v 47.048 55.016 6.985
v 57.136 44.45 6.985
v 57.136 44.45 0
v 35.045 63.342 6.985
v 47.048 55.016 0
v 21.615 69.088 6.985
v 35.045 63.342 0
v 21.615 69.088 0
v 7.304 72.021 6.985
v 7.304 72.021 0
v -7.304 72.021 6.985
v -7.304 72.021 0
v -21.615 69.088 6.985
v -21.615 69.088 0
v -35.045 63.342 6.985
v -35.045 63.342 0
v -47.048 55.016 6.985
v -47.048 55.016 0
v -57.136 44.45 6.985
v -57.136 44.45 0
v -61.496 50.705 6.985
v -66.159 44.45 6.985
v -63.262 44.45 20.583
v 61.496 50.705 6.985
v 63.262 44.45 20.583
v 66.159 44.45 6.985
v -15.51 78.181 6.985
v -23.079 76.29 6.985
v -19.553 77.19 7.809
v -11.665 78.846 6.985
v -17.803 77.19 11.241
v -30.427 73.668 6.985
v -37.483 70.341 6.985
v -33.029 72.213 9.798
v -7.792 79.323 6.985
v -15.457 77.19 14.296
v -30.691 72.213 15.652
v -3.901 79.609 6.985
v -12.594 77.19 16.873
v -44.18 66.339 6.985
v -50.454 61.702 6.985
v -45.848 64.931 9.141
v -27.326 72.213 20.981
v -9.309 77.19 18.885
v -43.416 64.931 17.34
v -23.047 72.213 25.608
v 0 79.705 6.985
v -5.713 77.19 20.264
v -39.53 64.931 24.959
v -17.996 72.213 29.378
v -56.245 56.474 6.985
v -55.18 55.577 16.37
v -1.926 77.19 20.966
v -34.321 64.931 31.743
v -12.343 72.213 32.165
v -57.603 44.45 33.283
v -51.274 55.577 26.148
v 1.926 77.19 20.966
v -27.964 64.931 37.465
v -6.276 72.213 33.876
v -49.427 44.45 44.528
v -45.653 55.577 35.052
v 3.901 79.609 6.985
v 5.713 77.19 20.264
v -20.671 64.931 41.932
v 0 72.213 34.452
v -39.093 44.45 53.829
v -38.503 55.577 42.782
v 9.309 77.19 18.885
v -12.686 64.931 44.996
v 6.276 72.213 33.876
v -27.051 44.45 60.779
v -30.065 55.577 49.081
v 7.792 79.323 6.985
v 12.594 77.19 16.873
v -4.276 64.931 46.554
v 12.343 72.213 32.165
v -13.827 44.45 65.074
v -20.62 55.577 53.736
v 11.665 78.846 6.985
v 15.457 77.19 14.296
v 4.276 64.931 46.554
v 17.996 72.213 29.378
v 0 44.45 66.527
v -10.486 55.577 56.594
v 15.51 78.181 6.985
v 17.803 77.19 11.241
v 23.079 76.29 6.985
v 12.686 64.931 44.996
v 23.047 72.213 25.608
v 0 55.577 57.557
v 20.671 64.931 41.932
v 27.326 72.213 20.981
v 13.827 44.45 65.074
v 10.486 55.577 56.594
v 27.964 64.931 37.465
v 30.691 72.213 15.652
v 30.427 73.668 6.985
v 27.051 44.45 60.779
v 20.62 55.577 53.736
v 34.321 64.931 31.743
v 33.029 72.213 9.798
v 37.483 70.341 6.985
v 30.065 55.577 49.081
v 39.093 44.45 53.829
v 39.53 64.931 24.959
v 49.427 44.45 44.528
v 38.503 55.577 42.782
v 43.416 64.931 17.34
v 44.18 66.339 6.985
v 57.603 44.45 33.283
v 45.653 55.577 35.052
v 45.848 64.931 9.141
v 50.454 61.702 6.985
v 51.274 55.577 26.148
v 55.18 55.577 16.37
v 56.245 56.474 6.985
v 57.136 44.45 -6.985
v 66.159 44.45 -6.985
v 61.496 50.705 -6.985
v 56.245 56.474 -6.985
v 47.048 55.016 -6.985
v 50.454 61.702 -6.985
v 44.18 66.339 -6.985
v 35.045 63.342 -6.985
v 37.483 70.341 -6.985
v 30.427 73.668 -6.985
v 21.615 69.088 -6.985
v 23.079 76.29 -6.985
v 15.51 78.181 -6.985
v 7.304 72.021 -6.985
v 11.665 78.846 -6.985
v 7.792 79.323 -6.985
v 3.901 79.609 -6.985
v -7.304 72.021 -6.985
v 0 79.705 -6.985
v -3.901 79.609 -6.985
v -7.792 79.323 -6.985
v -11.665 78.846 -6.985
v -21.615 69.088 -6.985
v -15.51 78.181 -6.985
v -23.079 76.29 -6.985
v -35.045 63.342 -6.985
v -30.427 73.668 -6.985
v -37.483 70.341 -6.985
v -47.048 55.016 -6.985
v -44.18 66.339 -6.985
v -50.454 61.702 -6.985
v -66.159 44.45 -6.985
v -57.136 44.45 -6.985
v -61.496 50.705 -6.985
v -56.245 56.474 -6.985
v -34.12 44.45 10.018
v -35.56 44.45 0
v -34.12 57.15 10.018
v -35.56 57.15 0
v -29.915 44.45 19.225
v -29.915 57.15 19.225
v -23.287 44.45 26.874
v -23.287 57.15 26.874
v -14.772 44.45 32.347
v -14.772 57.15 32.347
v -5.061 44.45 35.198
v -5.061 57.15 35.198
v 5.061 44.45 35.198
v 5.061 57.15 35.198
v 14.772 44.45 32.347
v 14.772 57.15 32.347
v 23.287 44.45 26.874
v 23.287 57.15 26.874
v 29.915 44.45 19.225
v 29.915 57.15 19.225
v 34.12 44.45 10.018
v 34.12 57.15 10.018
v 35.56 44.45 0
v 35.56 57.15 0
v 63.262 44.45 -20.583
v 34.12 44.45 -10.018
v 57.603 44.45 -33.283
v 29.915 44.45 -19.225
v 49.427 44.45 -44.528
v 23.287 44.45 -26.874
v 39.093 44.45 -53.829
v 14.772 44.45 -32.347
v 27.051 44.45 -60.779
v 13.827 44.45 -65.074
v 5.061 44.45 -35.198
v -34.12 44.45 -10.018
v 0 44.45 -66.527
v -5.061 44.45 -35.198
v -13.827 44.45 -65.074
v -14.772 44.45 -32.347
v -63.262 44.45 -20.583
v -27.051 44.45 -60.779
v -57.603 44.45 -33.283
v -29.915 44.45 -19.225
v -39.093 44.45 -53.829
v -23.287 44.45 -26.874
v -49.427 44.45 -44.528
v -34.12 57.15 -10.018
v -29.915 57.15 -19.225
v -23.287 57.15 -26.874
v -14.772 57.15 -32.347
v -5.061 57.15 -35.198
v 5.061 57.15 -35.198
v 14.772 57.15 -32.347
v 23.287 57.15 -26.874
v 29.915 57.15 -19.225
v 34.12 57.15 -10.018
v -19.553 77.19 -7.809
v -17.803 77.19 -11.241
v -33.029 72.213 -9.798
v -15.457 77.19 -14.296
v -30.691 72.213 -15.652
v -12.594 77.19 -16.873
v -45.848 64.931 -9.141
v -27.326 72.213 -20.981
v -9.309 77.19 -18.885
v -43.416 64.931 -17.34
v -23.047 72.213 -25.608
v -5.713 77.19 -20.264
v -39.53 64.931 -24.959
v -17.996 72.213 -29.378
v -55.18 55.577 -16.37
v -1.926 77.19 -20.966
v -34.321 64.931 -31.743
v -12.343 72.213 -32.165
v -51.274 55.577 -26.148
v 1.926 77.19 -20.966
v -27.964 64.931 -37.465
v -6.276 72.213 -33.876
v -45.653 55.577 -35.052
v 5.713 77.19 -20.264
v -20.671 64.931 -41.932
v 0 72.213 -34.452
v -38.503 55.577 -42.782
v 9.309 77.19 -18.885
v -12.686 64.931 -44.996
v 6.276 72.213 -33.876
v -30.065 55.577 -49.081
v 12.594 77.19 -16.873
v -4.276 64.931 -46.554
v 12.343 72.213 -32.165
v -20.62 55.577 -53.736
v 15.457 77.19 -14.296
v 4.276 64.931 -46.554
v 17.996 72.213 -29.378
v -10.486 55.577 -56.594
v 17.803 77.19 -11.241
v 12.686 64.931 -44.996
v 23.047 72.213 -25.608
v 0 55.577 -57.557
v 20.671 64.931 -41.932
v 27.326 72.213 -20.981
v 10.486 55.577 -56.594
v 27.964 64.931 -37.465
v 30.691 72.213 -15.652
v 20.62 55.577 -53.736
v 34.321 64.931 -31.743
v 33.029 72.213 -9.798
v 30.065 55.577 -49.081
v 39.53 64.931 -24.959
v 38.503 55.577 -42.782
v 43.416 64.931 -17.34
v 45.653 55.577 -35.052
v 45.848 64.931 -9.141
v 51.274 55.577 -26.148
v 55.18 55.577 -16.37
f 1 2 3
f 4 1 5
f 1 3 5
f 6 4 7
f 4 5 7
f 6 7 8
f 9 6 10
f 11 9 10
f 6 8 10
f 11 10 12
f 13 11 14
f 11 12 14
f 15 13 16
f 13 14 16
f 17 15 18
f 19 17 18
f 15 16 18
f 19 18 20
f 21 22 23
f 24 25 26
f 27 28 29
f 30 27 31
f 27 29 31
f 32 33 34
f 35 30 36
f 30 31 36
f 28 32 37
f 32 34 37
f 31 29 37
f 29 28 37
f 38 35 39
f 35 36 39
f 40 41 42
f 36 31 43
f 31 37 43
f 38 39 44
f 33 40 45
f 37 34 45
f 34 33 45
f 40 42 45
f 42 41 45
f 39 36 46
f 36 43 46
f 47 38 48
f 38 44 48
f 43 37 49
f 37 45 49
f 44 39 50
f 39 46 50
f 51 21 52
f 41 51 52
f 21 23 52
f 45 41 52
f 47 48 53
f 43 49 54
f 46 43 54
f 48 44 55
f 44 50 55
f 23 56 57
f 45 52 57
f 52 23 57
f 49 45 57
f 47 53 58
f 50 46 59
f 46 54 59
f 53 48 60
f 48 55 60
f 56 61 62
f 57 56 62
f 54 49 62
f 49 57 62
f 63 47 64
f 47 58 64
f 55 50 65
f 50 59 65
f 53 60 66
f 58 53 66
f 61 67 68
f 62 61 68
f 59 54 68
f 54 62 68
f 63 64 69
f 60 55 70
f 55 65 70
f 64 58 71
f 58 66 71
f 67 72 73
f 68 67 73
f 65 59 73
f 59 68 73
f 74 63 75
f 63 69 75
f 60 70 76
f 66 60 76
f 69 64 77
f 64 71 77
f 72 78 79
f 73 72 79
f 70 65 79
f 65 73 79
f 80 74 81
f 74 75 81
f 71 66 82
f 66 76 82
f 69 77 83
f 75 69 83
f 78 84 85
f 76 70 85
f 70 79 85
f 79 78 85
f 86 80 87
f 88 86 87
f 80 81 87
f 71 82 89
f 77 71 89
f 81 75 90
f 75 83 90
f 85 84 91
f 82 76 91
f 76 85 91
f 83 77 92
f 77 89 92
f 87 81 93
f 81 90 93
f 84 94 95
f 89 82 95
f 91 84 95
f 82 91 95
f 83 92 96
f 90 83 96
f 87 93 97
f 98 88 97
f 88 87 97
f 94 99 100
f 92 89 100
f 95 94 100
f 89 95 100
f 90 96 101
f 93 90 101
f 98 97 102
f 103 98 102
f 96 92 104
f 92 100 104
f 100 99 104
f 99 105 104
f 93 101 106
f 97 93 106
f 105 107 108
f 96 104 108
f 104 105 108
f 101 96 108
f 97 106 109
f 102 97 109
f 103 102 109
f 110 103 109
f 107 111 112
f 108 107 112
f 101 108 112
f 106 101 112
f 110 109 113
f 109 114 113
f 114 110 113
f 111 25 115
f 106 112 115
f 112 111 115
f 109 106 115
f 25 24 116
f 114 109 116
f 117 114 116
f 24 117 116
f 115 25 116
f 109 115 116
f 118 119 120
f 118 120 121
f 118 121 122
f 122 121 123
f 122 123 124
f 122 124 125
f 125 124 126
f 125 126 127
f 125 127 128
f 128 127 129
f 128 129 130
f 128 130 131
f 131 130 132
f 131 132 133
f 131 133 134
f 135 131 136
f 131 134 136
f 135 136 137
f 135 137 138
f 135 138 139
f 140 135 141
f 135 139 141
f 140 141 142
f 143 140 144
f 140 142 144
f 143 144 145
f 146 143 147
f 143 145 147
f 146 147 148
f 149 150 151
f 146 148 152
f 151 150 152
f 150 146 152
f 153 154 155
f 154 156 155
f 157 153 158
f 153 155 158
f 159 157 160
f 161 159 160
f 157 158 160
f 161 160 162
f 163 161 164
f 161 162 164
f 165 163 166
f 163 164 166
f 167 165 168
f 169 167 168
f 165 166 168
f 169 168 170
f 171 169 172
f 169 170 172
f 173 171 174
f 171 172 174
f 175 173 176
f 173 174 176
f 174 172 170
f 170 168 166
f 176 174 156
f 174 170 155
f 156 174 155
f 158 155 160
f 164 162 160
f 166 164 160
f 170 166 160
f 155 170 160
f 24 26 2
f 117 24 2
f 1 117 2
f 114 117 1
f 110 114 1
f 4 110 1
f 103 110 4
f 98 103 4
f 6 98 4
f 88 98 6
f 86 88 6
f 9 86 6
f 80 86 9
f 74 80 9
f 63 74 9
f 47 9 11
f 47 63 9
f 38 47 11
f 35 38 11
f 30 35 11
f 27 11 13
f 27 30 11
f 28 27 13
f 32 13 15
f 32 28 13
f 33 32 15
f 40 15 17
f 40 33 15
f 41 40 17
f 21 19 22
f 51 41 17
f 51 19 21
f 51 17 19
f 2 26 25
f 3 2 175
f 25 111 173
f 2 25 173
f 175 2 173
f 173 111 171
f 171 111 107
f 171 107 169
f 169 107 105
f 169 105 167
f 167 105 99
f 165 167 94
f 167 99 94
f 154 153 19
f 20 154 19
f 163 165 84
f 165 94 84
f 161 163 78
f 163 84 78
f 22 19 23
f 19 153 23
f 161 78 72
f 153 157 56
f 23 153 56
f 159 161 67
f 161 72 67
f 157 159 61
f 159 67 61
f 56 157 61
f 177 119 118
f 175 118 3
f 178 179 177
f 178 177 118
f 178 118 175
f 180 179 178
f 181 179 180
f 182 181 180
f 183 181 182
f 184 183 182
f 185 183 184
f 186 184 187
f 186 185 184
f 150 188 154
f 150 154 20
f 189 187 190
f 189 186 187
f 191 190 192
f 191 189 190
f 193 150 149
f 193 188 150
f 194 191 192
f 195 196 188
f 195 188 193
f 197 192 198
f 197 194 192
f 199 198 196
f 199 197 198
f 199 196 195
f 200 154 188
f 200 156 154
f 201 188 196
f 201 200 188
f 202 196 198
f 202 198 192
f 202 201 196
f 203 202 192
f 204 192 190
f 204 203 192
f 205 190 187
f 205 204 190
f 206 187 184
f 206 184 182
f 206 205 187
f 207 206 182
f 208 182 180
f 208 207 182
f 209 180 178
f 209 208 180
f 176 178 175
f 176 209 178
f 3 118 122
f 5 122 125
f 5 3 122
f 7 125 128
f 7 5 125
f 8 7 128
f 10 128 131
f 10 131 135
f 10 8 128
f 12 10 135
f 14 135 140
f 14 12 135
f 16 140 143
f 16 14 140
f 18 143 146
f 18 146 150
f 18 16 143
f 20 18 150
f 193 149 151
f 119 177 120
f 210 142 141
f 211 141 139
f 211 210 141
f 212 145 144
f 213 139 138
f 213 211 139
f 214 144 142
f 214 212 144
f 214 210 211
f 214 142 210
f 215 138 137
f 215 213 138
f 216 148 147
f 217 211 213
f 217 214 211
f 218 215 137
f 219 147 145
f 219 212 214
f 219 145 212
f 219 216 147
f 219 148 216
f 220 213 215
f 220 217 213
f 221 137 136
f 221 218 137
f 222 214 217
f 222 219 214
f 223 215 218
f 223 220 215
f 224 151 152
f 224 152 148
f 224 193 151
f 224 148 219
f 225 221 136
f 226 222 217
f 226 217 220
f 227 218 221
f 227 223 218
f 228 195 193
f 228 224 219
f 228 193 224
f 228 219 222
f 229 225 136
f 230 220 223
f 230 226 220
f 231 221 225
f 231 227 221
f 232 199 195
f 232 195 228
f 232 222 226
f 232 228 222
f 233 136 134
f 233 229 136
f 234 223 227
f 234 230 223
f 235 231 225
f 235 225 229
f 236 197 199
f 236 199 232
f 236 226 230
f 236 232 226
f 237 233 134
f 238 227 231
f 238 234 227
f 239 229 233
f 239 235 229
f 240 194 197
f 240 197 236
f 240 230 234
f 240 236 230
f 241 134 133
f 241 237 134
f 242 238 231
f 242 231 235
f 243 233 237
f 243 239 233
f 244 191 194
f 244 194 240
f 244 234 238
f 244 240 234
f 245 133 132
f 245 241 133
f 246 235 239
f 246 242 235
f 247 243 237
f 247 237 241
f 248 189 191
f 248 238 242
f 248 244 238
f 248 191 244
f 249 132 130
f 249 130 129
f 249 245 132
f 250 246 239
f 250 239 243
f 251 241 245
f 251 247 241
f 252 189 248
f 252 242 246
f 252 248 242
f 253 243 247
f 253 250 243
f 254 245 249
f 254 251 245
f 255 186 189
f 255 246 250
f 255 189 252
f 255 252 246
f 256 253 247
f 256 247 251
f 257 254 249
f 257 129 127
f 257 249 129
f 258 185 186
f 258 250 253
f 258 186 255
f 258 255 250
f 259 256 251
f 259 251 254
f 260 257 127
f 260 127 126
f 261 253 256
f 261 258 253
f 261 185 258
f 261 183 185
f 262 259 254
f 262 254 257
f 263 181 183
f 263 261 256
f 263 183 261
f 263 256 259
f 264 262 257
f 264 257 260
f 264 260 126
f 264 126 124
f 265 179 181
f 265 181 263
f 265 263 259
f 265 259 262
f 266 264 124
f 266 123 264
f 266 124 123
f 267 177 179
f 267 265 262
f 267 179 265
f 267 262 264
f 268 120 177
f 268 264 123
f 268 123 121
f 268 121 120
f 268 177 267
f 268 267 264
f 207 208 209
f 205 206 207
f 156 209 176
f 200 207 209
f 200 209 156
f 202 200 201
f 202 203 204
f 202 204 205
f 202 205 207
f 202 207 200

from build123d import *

# Parameters (mm, degrees)
REVOLVE3_ANGLE     = 180
CUT_EXTRUDE2_DEPTH = 6.985


with BuildPart() as part:
    # Sketch1 → Revolve3 (revolve)
    with BuildSketch(Plane.XY):
        with BuildLine():
            Line((-57.135887146, 44.45), (-35.56, 44.45))
            Line((-35.56, 44.45), (-35.56, 57.15))
            Line((-35.56, 57.15), (0, 57.15))
            Line((0, 57.15), (0, 72.39))
            Line((0, 72.39), (0, 80.01))
            ThreePointArc((0, 80.01), (-37.717075708, 70.562187466), (-66.526668337, 44.45))
            Line((-66.526668337, 44.45), (-57.135887146, 44.45))
        make_face()
    revolve3 = revolve(axis=Axis((0, 57.15, 0), (0, 1, 0)), revolution_arc=REVOLVE3_ANGLE)

    # Sketch4 → Cut-Extrude2 (cut)
    with BuildSketch(Plane(origin=(0, 0, 0), x_dir=(-1, 0, 0), z_dir=(0, 0, -1))):
        with BuildLine():
            Line((-66.526668337, 44.45), (-57.135887146, 44.45))
            ThreePointArc((-57.135887146, 44.45), (0, 72.39), (57.135887146, 44.45))
            Line((57.135887146, 44.45), (66.526668337, 44.45))
            ThreePointArc((66.526668337, 44.45), (0, 80.01), (-66.526668337, 44.45))
        make_face()
    cut_extrude2 = extrude(amount=-CUT_EXTRUDE2_DEPTH, mode=Mode.SUBTRACT)

    # Mirror1: Revolve3, Cut-Extrude2 across Front Plane
    add(revolve3.mirror(Plane.XY))
    add(cut_extrude2.mirror(Plane.XY), mode=Mode.SUBTRACT)


solid = part.part
